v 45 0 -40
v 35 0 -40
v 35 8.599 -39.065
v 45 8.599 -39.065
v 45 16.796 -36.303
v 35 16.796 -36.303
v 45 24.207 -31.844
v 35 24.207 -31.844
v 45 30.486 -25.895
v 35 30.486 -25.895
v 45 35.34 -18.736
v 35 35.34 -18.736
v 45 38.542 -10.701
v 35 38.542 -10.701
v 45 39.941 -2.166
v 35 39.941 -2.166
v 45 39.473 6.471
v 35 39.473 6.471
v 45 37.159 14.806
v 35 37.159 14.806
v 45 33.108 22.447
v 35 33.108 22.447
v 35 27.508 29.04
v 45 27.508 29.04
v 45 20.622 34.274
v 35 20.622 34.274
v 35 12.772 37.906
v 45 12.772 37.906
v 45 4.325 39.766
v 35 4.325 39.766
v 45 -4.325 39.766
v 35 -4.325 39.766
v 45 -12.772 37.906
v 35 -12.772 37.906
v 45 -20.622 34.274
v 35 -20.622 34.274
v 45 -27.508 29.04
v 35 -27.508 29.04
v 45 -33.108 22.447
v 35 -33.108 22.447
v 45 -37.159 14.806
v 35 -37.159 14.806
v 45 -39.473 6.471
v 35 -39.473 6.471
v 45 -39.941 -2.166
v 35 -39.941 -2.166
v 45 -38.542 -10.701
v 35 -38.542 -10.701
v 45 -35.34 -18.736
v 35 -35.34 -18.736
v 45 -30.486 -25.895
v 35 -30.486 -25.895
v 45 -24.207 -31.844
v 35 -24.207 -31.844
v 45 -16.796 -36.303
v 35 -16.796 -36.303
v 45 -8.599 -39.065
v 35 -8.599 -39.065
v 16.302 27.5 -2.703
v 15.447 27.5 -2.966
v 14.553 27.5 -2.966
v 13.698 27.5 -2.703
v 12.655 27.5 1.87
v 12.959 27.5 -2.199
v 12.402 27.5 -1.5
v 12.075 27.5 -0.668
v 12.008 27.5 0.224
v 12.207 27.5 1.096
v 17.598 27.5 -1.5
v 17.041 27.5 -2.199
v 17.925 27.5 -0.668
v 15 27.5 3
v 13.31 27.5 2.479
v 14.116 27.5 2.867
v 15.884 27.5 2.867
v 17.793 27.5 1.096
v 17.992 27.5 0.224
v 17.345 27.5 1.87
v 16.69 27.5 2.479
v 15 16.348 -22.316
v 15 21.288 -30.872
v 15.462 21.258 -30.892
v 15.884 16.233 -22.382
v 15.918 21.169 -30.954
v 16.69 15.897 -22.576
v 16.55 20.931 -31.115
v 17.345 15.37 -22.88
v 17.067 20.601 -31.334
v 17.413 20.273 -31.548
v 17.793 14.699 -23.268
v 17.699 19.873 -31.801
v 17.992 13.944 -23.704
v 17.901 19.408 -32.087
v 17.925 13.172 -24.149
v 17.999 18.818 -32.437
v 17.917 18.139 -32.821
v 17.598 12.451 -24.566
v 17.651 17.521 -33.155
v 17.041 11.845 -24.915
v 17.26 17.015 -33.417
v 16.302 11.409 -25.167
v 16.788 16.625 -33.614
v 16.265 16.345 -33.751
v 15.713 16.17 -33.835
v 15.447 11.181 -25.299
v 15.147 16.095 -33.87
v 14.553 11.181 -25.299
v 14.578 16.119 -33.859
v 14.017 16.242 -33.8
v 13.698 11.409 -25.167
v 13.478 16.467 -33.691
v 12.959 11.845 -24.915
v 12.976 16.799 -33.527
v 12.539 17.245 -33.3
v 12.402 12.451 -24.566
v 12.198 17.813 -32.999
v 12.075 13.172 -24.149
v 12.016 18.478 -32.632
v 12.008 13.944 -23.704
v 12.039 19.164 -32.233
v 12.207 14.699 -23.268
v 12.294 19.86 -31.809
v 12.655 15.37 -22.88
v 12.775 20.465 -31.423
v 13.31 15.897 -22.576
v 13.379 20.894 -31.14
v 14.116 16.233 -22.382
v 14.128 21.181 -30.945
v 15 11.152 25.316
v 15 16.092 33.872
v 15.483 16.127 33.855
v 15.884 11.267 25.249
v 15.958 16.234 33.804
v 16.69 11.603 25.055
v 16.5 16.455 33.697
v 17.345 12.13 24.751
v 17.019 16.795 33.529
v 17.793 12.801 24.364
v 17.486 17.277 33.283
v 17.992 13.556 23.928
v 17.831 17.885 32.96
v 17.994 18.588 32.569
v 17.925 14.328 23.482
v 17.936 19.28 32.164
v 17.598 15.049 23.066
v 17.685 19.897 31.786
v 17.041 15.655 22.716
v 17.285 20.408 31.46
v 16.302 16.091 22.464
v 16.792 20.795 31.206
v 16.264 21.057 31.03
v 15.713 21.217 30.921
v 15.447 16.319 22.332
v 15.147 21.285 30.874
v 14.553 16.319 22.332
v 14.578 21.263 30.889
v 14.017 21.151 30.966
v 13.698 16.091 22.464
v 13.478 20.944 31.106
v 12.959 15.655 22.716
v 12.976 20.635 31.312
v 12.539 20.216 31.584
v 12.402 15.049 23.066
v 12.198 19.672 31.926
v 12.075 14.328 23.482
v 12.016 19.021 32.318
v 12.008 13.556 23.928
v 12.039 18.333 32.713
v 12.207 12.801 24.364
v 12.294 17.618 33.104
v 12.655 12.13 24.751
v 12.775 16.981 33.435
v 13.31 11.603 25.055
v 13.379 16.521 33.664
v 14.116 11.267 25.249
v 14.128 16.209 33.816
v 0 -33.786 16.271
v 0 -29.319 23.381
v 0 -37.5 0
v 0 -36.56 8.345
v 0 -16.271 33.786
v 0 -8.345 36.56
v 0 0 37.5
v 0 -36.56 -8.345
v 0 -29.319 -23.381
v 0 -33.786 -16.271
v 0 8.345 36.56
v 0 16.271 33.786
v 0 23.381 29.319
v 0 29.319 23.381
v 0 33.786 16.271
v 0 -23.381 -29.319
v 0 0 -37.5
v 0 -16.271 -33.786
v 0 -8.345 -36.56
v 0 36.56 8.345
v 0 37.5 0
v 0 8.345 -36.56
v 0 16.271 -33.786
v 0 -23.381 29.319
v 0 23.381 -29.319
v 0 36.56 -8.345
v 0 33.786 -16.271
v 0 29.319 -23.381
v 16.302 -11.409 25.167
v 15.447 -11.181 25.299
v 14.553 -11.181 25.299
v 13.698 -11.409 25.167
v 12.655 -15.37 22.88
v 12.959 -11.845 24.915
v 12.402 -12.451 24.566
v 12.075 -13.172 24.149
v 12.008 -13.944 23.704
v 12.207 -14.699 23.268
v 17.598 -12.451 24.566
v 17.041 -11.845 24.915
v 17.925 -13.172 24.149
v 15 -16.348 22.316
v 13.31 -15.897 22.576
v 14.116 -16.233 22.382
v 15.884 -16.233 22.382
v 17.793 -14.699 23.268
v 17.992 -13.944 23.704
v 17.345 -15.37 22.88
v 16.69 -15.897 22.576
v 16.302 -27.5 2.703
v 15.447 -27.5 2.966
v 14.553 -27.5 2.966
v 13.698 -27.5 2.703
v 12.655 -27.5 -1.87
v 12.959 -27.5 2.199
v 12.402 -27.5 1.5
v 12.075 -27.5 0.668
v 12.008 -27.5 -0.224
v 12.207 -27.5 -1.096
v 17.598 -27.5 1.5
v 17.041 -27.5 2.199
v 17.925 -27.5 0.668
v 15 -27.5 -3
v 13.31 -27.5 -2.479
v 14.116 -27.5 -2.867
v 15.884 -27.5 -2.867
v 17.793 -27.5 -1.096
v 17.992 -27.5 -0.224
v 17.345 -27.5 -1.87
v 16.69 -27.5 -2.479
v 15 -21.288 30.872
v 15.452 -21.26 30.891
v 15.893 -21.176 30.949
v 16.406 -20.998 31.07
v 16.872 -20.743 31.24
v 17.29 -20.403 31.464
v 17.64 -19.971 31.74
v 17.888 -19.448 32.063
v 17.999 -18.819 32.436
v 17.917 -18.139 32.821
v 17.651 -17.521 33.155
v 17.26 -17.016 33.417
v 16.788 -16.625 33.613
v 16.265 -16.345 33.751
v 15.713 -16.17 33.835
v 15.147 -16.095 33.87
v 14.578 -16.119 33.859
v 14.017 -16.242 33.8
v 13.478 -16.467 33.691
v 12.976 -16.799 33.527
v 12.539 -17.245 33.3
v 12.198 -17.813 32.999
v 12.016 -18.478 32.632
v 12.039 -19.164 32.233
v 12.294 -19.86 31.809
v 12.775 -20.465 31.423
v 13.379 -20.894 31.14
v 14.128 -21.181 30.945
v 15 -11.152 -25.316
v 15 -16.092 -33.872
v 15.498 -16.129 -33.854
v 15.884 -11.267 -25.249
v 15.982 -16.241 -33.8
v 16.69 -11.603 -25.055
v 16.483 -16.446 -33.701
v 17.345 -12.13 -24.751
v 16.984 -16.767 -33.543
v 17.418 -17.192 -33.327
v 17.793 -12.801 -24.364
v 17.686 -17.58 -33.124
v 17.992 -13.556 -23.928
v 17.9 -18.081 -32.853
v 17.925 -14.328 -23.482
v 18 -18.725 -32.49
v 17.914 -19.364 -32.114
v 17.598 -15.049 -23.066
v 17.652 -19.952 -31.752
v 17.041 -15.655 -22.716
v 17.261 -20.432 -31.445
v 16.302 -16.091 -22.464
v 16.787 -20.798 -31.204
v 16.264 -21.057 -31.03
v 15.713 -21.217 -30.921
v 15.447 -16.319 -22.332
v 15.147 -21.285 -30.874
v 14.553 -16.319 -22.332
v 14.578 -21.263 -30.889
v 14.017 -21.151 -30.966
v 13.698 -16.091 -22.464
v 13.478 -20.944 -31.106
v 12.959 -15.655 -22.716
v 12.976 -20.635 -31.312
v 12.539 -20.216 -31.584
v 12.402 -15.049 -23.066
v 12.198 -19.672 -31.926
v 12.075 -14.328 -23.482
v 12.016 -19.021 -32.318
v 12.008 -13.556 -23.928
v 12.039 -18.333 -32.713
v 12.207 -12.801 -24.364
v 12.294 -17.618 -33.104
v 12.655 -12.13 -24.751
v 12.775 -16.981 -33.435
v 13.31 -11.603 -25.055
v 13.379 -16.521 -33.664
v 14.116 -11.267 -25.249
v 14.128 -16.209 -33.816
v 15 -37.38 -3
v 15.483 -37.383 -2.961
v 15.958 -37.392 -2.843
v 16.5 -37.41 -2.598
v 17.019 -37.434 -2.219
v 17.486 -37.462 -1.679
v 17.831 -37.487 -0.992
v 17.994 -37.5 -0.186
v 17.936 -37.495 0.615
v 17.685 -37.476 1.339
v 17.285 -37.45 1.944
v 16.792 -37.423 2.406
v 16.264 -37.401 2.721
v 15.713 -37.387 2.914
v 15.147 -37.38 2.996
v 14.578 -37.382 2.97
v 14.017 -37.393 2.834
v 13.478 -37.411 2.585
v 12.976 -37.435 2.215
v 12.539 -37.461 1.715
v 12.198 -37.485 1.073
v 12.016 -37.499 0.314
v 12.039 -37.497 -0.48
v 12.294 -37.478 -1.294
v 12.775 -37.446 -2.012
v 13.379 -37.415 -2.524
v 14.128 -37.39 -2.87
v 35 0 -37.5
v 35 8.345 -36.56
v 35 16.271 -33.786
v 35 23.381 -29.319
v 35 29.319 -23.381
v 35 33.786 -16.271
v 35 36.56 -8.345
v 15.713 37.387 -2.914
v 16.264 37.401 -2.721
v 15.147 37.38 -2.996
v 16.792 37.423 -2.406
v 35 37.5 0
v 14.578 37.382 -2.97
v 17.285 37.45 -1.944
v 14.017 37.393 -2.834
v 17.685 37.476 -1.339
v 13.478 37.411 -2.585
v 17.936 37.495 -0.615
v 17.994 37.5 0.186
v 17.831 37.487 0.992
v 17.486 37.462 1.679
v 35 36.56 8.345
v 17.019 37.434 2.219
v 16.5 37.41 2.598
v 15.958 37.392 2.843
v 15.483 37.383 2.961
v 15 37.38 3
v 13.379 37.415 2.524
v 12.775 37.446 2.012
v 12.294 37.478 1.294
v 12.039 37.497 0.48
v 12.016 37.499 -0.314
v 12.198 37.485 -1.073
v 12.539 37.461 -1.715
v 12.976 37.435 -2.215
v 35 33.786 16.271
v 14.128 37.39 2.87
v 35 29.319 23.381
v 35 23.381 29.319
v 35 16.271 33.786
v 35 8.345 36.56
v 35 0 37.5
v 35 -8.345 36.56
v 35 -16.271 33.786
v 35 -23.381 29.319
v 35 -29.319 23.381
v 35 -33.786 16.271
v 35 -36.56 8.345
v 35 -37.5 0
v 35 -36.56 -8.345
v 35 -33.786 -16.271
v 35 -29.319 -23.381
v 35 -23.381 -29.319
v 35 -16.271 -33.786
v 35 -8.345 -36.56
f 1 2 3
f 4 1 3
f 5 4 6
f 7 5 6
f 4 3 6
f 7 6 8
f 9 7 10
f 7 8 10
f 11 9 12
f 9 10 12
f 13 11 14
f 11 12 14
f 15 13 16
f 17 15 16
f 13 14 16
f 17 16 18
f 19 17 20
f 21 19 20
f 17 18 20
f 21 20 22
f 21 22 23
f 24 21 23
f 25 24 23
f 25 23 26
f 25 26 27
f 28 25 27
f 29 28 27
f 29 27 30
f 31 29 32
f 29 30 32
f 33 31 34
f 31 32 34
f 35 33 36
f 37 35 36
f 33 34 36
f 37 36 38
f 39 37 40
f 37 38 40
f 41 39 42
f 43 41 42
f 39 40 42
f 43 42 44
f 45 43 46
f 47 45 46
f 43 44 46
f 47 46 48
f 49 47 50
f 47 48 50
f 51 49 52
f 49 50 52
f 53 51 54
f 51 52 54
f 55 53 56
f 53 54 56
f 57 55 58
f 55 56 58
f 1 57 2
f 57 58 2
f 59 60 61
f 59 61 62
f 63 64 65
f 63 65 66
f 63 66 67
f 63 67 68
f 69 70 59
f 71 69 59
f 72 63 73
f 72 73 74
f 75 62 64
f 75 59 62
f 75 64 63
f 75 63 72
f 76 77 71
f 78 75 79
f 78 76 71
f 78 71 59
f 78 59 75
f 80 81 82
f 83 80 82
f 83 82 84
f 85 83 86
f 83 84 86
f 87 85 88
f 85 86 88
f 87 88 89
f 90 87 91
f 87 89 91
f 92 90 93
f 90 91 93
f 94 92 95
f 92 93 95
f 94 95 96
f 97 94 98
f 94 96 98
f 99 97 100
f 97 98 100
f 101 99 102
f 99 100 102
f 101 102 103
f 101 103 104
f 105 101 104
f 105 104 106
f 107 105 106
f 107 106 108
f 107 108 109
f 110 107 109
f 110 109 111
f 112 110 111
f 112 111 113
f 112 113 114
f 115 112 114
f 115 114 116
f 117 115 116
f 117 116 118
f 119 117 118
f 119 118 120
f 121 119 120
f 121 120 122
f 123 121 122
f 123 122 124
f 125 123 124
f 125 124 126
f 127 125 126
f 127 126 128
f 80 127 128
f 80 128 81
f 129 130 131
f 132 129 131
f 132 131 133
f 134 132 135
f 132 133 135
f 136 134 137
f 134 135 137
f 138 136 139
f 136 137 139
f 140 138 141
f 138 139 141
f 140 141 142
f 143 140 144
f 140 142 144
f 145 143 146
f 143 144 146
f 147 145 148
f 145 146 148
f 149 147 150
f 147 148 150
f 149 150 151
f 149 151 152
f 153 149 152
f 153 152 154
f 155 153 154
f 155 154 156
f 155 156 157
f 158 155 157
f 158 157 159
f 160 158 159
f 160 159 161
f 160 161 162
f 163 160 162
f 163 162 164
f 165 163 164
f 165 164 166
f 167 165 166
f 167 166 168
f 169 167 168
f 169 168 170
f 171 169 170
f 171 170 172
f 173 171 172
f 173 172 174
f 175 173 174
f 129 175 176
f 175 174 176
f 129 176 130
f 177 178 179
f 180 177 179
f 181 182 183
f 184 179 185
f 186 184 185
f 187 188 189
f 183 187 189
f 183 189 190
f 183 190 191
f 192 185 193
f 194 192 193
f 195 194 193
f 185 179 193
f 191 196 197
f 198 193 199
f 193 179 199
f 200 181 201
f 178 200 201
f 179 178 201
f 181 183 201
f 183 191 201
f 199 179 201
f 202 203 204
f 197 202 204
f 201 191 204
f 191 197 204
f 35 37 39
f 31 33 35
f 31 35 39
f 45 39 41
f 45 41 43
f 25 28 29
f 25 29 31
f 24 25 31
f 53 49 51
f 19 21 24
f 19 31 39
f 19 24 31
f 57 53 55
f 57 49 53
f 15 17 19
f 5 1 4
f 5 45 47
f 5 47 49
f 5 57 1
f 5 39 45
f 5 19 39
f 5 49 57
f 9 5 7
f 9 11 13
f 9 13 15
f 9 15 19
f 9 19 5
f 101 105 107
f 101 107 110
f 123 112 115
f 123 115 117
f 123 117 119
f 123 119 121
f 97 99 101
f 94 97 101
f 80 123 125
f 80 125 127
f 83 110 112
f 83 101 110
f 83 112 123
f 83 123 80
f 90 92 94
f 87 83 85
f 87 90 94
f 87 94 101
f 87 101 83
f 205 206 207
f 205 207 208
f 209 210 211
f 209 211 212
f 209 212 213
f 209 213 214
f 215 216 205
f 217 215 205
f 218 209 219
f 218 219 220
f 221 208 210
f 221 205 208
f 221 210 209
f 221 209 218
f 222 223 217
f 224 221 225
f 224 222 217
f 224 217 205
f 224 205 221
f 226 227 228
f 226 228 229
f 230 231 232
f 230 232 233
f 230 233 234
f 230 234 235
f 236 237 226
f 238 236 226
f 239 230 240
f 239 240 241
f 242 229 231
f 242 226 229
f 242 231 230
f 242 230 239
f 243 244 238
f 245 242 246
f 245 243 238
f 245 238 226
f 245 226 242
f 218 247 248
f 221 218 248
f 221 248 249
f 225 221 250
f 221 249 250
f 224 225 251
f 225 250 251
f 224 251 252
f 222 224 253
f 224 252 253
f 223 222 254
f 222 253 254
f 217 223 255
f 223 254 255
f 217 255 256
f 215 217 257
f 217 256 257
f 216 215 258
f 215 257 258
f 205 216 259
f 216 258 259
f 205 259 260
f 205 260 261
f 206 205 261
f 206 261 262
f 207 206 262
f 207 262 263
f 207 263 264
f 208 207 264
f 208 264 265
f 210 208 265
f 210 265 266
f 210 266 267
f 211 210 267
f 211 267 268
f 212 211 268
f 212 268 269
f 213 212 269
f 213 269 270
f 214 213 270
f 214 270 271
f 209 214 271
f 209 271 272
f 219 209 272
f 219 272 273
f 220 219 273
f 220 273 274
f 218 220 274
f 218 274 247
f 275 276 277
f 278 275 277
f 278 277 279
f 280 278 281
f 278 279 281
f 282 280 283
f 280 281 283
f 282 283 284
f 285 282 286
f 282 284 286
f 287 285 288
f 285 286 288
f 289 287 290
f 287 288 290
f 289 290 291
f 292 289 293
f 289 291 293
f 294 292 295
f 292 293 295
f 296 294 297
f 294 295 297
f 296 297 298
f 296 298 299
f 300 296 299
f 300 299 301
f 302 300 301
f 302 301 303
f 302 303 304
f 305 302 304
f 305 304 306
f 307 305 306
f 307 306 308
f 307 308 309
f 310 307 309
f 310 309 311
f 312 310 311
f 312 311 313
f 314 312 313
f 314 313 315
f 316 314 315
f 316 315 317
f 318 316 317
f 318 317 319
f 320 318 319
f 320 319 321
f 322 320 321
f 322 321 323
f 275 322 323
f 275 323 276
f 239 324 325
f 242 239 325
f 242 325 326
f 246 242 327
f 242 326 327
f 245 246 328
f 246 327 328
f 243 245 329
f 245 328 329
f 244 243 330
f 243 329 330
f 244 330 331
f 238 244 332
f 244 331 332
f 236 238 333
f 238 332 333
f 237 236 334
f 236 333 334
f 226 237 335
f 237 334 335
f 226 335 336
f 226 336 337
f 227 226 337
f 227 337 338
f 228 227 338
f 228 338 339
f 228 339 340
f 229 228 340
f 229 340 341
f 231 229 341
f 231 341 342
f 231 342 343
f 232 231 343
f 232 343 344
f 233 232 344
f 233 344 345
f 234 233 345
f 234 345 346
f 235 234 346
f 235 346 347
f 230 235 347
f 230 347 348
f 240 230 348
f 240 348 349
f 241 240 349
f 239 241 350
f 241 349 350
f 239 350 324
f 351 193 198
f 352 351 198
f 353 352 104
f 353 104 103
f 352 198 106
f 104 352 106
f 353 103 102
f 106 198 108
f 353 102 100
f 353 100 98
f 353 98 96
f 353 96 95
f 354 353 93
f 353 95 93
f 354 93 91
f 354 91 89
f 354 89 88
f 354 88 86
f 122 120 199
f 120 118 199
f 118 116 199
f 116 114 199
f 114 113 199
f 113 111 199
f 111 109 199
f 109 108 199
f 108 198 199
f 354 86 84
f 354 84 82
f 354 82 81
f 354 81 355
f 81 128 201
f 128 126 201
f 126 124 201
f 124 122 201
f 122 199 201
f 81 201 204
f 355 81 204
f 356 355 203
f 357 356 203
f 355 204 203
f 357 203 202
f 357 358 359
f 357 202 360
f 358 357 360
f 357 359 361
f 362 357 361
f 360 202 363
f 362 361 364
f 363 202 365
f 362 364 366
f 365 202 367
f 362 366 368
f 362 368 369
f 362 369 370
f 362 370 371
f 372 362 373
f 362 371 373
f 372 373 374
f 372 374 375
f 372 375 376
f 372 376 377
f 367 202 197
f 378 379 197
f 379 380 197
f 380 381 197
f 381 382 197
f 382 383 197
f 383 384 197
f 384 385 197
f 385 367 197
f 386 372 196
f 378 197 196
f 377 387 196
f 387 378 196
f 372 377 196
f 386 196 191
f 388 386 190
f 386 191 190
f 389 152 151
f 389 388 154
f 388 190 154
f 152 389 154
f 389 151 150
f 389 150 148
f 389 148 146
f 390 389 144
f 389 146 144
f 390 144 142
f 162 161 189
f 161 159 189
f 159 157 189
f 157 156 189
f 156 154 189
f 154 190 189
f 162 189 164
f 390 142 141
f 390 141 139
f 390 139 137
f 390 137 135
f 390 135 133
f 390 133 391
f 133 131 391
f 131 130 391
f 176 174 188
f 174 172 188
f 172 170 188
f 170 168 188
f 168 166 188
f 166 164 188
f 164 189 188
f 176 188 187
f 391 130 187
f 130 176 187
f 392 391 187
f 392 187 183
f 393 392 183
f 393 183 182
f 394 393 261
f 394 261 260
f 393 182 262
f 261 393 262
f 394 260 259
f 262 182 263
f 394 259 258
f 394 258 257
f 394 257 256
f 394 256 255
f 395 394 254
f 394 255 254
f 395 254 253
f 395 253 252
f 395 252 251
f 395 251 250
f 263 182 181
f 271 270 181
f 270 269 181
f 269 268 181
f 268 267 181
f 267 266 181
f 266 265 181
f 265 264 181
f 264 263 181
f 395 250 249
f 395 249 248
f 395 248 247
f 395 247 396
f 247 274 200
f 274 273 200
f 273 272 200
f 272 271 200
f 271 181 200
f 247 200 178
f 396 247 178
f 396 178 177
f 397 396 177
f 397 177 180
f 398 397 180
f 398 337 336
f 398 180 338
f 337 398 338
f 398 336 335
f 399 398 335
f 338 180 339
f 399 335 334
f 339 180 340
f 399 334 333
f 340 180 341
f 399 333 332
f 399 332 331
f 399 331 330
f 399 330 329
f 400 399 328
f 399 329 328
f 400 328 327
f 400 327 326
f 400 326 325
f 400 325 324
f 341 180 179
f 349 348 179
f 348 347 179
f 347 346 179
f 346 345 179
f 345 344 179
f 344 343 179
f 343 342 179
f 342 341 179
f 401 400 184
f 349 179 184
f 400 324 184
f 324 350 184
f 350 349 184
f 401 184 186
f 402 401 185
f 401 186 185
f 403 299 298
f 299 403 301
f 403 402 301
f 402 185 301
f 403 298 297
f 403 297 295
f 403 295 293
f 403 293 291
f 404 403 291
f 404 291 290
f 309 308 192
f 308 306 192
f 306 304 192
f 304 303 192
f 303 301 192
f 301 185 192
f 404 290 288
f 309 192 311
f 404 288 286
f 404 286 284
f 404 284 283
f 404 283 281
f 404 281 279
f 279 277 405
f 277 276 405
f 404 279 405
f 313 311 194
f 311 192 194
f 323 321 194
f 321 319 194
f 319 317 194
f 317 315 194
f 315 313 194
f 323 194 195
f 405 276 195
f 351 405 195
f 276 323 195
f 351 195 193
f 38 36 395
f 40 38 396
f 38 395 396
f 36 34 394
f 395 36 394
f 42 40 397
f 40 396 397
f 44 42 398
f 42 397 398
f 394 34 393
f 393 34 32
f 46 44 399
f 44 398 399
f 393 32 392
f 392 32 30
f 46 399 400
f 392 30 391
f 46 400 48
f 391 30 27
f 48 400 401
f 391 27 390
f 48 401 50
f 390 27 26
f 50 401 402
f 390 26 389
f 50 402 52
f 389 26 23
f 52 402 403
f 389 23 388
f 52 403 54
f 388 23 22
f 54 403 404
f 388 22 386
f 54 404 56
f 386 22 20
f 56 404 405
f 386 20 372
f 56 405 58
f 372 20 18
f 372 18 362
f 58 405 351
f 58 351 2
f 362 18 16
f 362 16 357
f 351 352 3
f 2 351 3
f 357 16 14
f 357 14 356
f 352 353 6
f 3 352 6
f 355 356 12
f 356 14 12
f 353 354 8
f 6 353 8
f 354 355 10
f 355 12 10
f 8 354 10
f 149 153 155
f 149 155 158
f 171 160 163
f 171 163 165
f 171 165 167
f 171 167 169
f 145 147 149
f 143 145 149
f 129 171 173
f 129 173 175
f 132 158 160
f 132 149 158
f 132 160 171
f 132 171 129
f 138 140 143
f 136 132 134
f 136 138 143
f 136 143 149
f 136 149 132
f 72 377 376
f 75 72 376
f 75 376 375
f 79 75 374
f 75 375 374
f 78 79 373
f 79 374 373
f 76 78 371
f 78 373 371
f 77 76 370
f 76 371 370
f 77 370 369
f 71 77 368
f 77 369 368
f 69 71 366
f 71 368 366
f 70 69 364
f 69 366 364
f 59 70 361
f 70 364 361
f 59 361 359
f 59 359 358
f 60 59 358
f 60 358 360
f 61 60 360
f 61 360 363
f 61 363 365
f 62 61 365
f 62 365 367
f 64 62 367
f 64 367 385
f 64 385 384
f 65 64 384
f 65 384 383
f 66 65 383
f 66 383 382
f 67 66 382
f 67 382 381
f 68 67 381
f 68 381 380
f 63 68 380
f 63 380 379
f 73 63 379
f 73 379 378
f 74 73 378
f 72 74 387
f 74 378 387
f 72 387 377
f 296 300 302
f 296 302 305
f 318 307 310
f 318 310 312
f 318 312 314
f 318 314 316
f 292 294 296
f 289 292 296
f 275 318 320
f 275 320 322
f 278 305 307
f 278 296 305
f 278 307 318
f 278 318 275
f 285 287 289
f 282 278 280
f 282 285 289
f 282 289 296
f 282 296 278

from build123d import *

# Parameters (mm, degrees)
SKETCH1_R           = 37.5
BOSS_EXTRUDE1_DEPTH = 35
SKETCH2_R           = 40
BOSS_EXTRUDE2_DEPTH = 10
SKETCH3_R           = 3
CUT_EXTRUDE1_DEPTH  = 10
CIRPATTERN1_COUNT   = 6


with BuildPart() as part:
    # Sketch1 → Boss-Extrude1 (new body)
    with BuildSketch(Plane(origin=(0, 0, 0), x_dir=(0, 0, -1), z_dir=(1, 0, 0))):
        Circle(SKETCH1_R)
    extrude(amount=BOSS_EXTRUDE1_DEPTH)

    # Sketch2 → Boss-Extrude2 (add)
    with BuildSketch(Plane(origin=(35, 0, 0), x_dir=(0, 0, -1), z_dir=(1, 0, 0))):
        Circle(SKETCH2_R)
    extrude(amount=BOSS_EXTRUDE2_DEPTH)

    # Sketch3 → Cut-Extrude1 (cut)
    with BuildSketch(Plane(origin=(0, 37.5, 0), x_dir=(1, 0, 0), z_dir=(0, 1, 0))):
        with Locations(Location((15, 0, 0), (0, 0, 270))):
            Circle(SKETCH3_R)
    cut_extrude1 = extrude(amount=-CUT_EXTRUDE1_DEPTH, mode=Mode.SUBTRACT)

    # CirPattern1: Cut-Extrude1 ×6 about axis
    cirpattern1_axis = Axis((0, 0, 0), (1, 0, 0))
    for i in range(1, CIRPATTERN1_COUNT):
        add(cut_extrude1.rotate(cirpattern1_axis, i * 360 / CIRPATTERN1_COUNT), mode=Mode.SUBTRACT)


solid = part.part
